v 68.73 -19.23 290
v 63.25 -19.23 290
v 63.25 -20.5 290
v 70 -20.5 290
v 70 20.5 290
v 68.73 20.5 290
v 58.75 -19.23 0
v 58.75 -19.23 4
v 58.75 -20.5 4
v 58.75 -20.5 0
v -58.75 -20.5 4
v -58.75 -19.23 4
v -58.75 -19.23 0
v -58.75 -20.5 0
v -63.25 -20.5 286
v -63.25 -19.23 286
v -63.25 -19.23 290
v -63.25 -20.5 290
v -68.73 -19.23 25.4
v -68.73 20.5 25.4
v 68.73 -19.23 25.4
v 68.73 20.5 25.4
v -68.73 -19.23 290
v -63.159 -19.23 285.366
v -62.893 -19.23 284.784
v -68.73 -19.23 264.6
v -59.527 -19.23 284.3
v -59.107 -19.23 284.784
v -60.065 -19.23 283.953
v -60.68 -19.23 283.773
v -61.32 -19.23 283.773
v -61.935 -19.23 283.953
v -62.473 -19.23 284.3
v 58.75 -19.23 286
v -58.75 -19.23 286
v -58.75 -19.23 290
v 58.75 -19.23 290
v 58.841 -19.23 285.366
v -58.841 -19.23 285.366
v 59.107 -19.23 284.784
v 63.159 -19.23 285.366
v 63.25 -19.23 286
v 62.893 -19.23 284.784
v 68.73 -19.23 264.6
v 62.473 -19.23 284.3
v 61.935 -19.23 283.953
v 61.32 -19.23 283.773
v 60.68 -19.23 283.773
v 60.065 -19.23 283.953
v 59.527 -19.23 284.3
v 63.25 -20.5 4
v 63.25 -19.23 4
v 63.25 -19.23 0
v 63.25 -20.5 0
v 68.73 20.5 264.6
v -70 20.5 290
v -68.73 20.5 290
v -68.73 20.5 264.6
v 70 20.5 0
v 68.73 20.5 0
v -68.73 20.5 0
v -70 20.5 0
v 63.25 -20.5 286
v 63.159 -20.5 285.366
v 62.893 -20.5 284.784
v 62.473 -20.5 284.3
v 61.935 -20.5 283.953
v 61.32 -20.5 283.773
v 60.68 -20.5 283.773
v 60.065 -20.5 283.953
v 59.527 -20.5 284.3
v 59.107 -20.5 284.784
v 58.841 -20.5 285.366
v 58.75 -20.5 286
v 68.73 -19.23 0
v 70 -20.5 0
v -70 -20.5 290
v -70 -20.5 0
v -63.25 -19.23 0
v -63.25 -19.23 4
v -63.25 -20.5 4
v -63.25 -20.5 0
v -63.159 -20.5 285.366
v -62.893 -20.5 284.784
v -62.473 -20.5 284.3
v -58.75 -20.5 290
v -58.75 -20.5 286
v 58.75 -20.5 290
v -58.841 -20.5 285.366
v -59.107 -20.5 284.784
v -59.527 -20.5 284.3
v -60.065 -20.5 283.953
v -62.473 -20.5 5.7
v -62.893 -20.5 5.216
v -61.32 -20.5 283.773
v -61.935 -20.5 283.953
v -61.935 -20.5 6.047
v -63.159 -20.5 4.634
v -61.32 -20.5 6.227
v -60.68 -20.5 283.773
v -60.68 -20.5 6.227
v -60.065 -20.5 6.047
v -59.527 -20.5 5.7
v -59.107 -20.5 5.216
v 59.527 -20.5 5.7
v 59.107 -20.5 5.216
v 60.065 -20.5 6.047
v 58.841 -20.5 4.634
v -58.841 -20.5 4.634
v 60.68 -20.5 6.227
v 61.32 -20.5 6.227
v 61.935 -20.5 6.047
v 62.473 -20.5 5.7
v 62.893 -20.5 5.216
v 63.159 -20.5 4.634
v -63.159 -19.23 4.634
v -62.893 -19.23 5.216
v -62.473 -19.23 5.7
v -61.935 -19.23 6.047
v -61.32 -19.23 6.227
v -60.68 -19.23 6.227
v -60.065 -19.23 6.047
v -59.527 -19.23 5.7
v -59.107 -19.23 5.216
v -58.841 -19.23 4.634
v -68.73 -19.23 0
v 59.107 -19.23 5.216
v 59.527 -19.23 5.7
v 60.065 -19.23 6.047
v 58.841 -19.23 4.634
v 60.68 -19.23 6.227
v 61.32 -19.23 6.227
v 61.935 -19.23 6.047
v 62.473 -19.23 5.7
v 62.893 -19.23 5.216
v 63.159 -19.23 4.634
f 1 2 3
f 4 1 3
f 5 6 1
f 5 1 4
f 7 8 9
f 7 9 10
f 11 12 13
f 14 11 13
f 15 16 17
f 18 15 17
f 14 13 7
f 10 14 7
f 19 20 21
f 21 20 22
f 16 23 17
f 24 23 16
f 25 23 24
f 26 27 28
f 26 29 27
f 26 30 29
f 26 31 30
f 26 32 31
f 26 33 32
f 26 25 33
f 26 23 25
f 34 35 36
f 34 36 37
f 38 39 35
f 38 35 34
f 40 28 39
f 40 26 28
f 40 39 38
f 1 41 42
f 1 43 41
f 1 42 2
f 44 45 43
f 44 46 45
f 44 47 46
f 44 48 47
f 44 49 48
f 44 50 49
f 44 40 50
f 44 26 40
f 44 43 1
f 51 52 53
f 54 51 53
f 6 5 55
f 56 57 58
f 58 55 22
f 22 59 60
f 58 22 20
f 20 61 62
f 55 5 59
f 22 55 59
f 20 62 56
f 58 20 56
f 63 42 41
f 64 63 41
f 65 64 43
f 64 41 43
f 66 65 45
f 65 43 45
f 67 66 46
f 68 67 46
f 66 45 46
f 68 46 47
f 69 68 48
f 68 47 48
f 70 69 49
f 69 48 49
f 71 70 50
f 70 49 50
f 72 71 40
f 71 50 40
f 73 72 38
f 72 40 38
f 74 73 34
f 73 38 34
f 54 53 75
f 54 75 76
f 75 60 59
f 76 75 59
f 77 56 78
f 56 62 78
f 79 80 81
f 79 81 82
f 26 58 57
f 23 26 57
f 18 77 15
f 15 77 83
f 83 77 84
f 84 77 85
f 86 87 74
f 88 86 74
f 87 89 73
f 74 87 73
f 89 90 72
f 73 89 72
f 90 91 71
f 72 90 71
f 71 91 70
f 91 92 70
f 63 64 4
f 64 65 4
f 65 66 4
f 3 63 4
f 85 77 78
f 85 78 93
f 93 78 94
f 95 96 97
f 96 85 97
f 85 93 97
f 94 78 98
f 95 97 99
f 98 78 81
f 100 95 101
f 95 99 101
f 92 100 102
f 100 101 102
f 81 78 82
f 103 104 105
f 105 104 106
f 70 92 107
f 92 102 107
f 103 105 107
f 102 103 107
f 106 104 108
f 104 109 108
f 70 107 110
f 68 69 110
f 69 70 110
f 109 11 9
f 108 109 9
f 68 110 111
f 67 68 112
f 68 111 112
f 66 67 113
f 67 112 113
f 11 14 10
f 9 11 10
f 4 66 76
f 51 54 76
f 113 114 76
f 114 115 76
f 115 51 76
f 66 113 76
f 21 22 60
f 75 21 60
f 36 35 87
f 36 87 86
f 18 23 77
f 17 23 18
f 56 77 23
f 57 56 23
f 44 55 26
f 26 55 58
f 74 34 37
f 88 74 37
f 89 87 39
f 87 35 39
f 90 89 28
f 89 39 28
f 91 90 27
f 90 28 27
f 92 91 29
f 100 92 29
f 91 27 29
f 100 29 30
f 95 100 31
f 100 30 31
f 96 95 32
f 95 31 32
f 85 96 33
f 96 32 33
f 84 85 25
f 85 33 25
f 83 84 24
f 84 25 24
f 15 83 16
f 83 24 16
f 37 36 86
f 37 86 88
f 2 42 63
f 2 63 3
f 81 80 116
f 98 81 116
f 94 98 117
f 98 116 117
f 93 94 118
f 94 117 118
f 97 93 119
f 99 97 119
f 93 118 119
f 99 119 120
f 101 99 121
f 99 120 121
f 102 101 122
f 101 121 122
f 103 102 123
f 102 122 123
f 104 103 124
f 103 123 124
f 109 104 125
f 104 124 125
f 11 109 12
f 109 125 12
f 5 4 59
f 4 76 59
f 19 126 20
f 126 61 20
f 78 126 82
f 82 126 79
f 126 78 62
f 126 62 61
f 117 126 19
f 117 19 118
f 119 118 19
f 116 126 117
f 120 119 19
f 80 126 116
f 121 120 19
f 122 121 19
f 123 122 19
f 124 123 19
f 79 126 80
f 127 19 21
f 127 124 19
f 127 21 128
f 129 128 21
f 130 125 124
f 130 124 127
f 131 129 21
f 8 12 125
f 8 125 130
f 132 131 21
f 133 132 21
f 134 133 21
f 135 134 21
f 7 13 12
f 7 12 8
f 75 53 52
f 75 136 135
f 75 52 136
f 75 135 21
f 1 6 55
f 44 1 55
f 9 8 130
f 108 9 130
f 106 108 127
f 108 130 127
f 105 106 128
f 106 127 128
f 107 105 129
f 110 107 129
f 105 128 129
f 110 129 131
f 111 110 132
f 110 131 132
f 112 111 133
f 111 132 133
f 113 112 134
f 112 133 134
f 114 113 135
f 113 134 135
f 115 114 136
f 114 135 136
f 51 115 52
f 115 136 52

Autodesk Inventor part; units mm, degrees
ref_plane "YZ Plane" through (0, 0, 0) normal (1, 0, 0) x (0, 1, 0)
ref_plane "XZ Plane" through (0, 0, 0) normal (0, 1, 0) x (-1, 0, 0)
sketch "Sketch1" plane through (0, 0, 0) normal (0, 0, 1) x (1, 0, 0)
  line L0 (-70, -20.5) -> (70, -20.5)
  line L1 (70, -20.5) -> (70, 20.5)
  line L2 (70, 20.5) -> (-70, 20.5)
  line L3 (-70, 20.5) -> (-70, -20.5)
  line L4 (-70, -20.5) -> (70, 20.5) construction
  line L5 (70, -20.5) -> (-70, 20.5) construction
  point P0 (0, 0)
  dimension "d0" = 140
  dimension "d1" = 41
extrude "Extrusion1" add sketch "Sketch1" along normal blind 290
sketch "Sketch2" plane through (-70, 20.5, 0) normal (0, 1, 0) x (1, 0, 0)
  line L0 (140, -290) -> (0, -290) projected
  line L1 (140, 0) -> (0, 0) projected
  arc A0 (11.25, -286) -> (6.75, -286) centre (9, -286) ccw
  arc A1 (133.25, -286) -> (128.75, -286) centre (131, -286) ccw
  arc A2 (128.75, -4) -> (133.25, -4) centre (131, -4) ccw
  arc A3 (6.75, -4) -> (11.25, -4) centre (9, -4) ccw
  line L2 (9, -286) -> (9, -4) construction
  line L3 (9, -4) -> (131, -4) construction
  line L4 (131, -4) -> (131, -286) construction
  line L5 (9, -286) -> (9, -290) construction
  line L6 (9, -4) -> (9, 0) construction
  line L7 (9, -4) -> (0, 0) construction
  line L8 (131, -4) -> (140, 0) construction
  line L9 (128.75, -286) -> (128.75, -290)
  line L10 (133.25, -286) -> (133.25, -290)
  line L11 (6.75, -286) -> (6.75, -290)
  line L12 (11.25, -286) -> (11.25, -290)
  line L13 (11.25, -4) -> (11.25, 0)
  line L14 (6.75, -4) -> (6.75, 0)
  line L15 (133.25, -4) -> (133.25, 0)
  line L16 (128.75, -4) -> (128.75, 0)
  point P0 (70, 0)
  dimension "d4" = 2.25
  dimension "d5" = 282
  dimension "d6" = 122
extrude "Extrusion2" cut sketch "Sketch2" against normal up to surface (41 mm away)
ref_plane "Work Plane1" through (70, -19.23, 0) normal (0, -1, 0) x (1, 0, 0)
sketch "Sketch3" plane through (-70, 20.5, 290) normal (0, 1, 0) x (1, 0, 0)
  line L0 (0, 290) -> (0, 0) projected
  line L1 (140, 290) -> (140, 0) projected
  line L2 (138.73, 0) -> (138.73, 25.4)
  line L3 (138.73, 25.4) -> (1.27, 25.4)
  line L4 (1.27, 25.4) -> (1.27, 0)
  line L5 (1.27, 0) -> (138.73, 0)
  line L6 (1.27, 0) -> (0, 0) construction
  line L7 (140, 0) -> (138.73, 0) construction
  line L8 (1.27, 264.6) -> (138.73, 264.6)
  line L9 (138.73, 264.6) -> (138.73, 290)
  line L10 (138.73, 290) -> (1.27, 290)
  line L11 (1.27, 290) -> (1.27, 264.6)
  line L12 (1.27, 290) -> (0, 290) construction
  point P0 (70, 290)
  dimension "d9" = 1.27
  dimension "d10" = 25.4
extrude "Extrusion3" cut sketch "Sketch3" against normal up to surface (39.73 mm away)
properties part number "UHP-1500-230"
